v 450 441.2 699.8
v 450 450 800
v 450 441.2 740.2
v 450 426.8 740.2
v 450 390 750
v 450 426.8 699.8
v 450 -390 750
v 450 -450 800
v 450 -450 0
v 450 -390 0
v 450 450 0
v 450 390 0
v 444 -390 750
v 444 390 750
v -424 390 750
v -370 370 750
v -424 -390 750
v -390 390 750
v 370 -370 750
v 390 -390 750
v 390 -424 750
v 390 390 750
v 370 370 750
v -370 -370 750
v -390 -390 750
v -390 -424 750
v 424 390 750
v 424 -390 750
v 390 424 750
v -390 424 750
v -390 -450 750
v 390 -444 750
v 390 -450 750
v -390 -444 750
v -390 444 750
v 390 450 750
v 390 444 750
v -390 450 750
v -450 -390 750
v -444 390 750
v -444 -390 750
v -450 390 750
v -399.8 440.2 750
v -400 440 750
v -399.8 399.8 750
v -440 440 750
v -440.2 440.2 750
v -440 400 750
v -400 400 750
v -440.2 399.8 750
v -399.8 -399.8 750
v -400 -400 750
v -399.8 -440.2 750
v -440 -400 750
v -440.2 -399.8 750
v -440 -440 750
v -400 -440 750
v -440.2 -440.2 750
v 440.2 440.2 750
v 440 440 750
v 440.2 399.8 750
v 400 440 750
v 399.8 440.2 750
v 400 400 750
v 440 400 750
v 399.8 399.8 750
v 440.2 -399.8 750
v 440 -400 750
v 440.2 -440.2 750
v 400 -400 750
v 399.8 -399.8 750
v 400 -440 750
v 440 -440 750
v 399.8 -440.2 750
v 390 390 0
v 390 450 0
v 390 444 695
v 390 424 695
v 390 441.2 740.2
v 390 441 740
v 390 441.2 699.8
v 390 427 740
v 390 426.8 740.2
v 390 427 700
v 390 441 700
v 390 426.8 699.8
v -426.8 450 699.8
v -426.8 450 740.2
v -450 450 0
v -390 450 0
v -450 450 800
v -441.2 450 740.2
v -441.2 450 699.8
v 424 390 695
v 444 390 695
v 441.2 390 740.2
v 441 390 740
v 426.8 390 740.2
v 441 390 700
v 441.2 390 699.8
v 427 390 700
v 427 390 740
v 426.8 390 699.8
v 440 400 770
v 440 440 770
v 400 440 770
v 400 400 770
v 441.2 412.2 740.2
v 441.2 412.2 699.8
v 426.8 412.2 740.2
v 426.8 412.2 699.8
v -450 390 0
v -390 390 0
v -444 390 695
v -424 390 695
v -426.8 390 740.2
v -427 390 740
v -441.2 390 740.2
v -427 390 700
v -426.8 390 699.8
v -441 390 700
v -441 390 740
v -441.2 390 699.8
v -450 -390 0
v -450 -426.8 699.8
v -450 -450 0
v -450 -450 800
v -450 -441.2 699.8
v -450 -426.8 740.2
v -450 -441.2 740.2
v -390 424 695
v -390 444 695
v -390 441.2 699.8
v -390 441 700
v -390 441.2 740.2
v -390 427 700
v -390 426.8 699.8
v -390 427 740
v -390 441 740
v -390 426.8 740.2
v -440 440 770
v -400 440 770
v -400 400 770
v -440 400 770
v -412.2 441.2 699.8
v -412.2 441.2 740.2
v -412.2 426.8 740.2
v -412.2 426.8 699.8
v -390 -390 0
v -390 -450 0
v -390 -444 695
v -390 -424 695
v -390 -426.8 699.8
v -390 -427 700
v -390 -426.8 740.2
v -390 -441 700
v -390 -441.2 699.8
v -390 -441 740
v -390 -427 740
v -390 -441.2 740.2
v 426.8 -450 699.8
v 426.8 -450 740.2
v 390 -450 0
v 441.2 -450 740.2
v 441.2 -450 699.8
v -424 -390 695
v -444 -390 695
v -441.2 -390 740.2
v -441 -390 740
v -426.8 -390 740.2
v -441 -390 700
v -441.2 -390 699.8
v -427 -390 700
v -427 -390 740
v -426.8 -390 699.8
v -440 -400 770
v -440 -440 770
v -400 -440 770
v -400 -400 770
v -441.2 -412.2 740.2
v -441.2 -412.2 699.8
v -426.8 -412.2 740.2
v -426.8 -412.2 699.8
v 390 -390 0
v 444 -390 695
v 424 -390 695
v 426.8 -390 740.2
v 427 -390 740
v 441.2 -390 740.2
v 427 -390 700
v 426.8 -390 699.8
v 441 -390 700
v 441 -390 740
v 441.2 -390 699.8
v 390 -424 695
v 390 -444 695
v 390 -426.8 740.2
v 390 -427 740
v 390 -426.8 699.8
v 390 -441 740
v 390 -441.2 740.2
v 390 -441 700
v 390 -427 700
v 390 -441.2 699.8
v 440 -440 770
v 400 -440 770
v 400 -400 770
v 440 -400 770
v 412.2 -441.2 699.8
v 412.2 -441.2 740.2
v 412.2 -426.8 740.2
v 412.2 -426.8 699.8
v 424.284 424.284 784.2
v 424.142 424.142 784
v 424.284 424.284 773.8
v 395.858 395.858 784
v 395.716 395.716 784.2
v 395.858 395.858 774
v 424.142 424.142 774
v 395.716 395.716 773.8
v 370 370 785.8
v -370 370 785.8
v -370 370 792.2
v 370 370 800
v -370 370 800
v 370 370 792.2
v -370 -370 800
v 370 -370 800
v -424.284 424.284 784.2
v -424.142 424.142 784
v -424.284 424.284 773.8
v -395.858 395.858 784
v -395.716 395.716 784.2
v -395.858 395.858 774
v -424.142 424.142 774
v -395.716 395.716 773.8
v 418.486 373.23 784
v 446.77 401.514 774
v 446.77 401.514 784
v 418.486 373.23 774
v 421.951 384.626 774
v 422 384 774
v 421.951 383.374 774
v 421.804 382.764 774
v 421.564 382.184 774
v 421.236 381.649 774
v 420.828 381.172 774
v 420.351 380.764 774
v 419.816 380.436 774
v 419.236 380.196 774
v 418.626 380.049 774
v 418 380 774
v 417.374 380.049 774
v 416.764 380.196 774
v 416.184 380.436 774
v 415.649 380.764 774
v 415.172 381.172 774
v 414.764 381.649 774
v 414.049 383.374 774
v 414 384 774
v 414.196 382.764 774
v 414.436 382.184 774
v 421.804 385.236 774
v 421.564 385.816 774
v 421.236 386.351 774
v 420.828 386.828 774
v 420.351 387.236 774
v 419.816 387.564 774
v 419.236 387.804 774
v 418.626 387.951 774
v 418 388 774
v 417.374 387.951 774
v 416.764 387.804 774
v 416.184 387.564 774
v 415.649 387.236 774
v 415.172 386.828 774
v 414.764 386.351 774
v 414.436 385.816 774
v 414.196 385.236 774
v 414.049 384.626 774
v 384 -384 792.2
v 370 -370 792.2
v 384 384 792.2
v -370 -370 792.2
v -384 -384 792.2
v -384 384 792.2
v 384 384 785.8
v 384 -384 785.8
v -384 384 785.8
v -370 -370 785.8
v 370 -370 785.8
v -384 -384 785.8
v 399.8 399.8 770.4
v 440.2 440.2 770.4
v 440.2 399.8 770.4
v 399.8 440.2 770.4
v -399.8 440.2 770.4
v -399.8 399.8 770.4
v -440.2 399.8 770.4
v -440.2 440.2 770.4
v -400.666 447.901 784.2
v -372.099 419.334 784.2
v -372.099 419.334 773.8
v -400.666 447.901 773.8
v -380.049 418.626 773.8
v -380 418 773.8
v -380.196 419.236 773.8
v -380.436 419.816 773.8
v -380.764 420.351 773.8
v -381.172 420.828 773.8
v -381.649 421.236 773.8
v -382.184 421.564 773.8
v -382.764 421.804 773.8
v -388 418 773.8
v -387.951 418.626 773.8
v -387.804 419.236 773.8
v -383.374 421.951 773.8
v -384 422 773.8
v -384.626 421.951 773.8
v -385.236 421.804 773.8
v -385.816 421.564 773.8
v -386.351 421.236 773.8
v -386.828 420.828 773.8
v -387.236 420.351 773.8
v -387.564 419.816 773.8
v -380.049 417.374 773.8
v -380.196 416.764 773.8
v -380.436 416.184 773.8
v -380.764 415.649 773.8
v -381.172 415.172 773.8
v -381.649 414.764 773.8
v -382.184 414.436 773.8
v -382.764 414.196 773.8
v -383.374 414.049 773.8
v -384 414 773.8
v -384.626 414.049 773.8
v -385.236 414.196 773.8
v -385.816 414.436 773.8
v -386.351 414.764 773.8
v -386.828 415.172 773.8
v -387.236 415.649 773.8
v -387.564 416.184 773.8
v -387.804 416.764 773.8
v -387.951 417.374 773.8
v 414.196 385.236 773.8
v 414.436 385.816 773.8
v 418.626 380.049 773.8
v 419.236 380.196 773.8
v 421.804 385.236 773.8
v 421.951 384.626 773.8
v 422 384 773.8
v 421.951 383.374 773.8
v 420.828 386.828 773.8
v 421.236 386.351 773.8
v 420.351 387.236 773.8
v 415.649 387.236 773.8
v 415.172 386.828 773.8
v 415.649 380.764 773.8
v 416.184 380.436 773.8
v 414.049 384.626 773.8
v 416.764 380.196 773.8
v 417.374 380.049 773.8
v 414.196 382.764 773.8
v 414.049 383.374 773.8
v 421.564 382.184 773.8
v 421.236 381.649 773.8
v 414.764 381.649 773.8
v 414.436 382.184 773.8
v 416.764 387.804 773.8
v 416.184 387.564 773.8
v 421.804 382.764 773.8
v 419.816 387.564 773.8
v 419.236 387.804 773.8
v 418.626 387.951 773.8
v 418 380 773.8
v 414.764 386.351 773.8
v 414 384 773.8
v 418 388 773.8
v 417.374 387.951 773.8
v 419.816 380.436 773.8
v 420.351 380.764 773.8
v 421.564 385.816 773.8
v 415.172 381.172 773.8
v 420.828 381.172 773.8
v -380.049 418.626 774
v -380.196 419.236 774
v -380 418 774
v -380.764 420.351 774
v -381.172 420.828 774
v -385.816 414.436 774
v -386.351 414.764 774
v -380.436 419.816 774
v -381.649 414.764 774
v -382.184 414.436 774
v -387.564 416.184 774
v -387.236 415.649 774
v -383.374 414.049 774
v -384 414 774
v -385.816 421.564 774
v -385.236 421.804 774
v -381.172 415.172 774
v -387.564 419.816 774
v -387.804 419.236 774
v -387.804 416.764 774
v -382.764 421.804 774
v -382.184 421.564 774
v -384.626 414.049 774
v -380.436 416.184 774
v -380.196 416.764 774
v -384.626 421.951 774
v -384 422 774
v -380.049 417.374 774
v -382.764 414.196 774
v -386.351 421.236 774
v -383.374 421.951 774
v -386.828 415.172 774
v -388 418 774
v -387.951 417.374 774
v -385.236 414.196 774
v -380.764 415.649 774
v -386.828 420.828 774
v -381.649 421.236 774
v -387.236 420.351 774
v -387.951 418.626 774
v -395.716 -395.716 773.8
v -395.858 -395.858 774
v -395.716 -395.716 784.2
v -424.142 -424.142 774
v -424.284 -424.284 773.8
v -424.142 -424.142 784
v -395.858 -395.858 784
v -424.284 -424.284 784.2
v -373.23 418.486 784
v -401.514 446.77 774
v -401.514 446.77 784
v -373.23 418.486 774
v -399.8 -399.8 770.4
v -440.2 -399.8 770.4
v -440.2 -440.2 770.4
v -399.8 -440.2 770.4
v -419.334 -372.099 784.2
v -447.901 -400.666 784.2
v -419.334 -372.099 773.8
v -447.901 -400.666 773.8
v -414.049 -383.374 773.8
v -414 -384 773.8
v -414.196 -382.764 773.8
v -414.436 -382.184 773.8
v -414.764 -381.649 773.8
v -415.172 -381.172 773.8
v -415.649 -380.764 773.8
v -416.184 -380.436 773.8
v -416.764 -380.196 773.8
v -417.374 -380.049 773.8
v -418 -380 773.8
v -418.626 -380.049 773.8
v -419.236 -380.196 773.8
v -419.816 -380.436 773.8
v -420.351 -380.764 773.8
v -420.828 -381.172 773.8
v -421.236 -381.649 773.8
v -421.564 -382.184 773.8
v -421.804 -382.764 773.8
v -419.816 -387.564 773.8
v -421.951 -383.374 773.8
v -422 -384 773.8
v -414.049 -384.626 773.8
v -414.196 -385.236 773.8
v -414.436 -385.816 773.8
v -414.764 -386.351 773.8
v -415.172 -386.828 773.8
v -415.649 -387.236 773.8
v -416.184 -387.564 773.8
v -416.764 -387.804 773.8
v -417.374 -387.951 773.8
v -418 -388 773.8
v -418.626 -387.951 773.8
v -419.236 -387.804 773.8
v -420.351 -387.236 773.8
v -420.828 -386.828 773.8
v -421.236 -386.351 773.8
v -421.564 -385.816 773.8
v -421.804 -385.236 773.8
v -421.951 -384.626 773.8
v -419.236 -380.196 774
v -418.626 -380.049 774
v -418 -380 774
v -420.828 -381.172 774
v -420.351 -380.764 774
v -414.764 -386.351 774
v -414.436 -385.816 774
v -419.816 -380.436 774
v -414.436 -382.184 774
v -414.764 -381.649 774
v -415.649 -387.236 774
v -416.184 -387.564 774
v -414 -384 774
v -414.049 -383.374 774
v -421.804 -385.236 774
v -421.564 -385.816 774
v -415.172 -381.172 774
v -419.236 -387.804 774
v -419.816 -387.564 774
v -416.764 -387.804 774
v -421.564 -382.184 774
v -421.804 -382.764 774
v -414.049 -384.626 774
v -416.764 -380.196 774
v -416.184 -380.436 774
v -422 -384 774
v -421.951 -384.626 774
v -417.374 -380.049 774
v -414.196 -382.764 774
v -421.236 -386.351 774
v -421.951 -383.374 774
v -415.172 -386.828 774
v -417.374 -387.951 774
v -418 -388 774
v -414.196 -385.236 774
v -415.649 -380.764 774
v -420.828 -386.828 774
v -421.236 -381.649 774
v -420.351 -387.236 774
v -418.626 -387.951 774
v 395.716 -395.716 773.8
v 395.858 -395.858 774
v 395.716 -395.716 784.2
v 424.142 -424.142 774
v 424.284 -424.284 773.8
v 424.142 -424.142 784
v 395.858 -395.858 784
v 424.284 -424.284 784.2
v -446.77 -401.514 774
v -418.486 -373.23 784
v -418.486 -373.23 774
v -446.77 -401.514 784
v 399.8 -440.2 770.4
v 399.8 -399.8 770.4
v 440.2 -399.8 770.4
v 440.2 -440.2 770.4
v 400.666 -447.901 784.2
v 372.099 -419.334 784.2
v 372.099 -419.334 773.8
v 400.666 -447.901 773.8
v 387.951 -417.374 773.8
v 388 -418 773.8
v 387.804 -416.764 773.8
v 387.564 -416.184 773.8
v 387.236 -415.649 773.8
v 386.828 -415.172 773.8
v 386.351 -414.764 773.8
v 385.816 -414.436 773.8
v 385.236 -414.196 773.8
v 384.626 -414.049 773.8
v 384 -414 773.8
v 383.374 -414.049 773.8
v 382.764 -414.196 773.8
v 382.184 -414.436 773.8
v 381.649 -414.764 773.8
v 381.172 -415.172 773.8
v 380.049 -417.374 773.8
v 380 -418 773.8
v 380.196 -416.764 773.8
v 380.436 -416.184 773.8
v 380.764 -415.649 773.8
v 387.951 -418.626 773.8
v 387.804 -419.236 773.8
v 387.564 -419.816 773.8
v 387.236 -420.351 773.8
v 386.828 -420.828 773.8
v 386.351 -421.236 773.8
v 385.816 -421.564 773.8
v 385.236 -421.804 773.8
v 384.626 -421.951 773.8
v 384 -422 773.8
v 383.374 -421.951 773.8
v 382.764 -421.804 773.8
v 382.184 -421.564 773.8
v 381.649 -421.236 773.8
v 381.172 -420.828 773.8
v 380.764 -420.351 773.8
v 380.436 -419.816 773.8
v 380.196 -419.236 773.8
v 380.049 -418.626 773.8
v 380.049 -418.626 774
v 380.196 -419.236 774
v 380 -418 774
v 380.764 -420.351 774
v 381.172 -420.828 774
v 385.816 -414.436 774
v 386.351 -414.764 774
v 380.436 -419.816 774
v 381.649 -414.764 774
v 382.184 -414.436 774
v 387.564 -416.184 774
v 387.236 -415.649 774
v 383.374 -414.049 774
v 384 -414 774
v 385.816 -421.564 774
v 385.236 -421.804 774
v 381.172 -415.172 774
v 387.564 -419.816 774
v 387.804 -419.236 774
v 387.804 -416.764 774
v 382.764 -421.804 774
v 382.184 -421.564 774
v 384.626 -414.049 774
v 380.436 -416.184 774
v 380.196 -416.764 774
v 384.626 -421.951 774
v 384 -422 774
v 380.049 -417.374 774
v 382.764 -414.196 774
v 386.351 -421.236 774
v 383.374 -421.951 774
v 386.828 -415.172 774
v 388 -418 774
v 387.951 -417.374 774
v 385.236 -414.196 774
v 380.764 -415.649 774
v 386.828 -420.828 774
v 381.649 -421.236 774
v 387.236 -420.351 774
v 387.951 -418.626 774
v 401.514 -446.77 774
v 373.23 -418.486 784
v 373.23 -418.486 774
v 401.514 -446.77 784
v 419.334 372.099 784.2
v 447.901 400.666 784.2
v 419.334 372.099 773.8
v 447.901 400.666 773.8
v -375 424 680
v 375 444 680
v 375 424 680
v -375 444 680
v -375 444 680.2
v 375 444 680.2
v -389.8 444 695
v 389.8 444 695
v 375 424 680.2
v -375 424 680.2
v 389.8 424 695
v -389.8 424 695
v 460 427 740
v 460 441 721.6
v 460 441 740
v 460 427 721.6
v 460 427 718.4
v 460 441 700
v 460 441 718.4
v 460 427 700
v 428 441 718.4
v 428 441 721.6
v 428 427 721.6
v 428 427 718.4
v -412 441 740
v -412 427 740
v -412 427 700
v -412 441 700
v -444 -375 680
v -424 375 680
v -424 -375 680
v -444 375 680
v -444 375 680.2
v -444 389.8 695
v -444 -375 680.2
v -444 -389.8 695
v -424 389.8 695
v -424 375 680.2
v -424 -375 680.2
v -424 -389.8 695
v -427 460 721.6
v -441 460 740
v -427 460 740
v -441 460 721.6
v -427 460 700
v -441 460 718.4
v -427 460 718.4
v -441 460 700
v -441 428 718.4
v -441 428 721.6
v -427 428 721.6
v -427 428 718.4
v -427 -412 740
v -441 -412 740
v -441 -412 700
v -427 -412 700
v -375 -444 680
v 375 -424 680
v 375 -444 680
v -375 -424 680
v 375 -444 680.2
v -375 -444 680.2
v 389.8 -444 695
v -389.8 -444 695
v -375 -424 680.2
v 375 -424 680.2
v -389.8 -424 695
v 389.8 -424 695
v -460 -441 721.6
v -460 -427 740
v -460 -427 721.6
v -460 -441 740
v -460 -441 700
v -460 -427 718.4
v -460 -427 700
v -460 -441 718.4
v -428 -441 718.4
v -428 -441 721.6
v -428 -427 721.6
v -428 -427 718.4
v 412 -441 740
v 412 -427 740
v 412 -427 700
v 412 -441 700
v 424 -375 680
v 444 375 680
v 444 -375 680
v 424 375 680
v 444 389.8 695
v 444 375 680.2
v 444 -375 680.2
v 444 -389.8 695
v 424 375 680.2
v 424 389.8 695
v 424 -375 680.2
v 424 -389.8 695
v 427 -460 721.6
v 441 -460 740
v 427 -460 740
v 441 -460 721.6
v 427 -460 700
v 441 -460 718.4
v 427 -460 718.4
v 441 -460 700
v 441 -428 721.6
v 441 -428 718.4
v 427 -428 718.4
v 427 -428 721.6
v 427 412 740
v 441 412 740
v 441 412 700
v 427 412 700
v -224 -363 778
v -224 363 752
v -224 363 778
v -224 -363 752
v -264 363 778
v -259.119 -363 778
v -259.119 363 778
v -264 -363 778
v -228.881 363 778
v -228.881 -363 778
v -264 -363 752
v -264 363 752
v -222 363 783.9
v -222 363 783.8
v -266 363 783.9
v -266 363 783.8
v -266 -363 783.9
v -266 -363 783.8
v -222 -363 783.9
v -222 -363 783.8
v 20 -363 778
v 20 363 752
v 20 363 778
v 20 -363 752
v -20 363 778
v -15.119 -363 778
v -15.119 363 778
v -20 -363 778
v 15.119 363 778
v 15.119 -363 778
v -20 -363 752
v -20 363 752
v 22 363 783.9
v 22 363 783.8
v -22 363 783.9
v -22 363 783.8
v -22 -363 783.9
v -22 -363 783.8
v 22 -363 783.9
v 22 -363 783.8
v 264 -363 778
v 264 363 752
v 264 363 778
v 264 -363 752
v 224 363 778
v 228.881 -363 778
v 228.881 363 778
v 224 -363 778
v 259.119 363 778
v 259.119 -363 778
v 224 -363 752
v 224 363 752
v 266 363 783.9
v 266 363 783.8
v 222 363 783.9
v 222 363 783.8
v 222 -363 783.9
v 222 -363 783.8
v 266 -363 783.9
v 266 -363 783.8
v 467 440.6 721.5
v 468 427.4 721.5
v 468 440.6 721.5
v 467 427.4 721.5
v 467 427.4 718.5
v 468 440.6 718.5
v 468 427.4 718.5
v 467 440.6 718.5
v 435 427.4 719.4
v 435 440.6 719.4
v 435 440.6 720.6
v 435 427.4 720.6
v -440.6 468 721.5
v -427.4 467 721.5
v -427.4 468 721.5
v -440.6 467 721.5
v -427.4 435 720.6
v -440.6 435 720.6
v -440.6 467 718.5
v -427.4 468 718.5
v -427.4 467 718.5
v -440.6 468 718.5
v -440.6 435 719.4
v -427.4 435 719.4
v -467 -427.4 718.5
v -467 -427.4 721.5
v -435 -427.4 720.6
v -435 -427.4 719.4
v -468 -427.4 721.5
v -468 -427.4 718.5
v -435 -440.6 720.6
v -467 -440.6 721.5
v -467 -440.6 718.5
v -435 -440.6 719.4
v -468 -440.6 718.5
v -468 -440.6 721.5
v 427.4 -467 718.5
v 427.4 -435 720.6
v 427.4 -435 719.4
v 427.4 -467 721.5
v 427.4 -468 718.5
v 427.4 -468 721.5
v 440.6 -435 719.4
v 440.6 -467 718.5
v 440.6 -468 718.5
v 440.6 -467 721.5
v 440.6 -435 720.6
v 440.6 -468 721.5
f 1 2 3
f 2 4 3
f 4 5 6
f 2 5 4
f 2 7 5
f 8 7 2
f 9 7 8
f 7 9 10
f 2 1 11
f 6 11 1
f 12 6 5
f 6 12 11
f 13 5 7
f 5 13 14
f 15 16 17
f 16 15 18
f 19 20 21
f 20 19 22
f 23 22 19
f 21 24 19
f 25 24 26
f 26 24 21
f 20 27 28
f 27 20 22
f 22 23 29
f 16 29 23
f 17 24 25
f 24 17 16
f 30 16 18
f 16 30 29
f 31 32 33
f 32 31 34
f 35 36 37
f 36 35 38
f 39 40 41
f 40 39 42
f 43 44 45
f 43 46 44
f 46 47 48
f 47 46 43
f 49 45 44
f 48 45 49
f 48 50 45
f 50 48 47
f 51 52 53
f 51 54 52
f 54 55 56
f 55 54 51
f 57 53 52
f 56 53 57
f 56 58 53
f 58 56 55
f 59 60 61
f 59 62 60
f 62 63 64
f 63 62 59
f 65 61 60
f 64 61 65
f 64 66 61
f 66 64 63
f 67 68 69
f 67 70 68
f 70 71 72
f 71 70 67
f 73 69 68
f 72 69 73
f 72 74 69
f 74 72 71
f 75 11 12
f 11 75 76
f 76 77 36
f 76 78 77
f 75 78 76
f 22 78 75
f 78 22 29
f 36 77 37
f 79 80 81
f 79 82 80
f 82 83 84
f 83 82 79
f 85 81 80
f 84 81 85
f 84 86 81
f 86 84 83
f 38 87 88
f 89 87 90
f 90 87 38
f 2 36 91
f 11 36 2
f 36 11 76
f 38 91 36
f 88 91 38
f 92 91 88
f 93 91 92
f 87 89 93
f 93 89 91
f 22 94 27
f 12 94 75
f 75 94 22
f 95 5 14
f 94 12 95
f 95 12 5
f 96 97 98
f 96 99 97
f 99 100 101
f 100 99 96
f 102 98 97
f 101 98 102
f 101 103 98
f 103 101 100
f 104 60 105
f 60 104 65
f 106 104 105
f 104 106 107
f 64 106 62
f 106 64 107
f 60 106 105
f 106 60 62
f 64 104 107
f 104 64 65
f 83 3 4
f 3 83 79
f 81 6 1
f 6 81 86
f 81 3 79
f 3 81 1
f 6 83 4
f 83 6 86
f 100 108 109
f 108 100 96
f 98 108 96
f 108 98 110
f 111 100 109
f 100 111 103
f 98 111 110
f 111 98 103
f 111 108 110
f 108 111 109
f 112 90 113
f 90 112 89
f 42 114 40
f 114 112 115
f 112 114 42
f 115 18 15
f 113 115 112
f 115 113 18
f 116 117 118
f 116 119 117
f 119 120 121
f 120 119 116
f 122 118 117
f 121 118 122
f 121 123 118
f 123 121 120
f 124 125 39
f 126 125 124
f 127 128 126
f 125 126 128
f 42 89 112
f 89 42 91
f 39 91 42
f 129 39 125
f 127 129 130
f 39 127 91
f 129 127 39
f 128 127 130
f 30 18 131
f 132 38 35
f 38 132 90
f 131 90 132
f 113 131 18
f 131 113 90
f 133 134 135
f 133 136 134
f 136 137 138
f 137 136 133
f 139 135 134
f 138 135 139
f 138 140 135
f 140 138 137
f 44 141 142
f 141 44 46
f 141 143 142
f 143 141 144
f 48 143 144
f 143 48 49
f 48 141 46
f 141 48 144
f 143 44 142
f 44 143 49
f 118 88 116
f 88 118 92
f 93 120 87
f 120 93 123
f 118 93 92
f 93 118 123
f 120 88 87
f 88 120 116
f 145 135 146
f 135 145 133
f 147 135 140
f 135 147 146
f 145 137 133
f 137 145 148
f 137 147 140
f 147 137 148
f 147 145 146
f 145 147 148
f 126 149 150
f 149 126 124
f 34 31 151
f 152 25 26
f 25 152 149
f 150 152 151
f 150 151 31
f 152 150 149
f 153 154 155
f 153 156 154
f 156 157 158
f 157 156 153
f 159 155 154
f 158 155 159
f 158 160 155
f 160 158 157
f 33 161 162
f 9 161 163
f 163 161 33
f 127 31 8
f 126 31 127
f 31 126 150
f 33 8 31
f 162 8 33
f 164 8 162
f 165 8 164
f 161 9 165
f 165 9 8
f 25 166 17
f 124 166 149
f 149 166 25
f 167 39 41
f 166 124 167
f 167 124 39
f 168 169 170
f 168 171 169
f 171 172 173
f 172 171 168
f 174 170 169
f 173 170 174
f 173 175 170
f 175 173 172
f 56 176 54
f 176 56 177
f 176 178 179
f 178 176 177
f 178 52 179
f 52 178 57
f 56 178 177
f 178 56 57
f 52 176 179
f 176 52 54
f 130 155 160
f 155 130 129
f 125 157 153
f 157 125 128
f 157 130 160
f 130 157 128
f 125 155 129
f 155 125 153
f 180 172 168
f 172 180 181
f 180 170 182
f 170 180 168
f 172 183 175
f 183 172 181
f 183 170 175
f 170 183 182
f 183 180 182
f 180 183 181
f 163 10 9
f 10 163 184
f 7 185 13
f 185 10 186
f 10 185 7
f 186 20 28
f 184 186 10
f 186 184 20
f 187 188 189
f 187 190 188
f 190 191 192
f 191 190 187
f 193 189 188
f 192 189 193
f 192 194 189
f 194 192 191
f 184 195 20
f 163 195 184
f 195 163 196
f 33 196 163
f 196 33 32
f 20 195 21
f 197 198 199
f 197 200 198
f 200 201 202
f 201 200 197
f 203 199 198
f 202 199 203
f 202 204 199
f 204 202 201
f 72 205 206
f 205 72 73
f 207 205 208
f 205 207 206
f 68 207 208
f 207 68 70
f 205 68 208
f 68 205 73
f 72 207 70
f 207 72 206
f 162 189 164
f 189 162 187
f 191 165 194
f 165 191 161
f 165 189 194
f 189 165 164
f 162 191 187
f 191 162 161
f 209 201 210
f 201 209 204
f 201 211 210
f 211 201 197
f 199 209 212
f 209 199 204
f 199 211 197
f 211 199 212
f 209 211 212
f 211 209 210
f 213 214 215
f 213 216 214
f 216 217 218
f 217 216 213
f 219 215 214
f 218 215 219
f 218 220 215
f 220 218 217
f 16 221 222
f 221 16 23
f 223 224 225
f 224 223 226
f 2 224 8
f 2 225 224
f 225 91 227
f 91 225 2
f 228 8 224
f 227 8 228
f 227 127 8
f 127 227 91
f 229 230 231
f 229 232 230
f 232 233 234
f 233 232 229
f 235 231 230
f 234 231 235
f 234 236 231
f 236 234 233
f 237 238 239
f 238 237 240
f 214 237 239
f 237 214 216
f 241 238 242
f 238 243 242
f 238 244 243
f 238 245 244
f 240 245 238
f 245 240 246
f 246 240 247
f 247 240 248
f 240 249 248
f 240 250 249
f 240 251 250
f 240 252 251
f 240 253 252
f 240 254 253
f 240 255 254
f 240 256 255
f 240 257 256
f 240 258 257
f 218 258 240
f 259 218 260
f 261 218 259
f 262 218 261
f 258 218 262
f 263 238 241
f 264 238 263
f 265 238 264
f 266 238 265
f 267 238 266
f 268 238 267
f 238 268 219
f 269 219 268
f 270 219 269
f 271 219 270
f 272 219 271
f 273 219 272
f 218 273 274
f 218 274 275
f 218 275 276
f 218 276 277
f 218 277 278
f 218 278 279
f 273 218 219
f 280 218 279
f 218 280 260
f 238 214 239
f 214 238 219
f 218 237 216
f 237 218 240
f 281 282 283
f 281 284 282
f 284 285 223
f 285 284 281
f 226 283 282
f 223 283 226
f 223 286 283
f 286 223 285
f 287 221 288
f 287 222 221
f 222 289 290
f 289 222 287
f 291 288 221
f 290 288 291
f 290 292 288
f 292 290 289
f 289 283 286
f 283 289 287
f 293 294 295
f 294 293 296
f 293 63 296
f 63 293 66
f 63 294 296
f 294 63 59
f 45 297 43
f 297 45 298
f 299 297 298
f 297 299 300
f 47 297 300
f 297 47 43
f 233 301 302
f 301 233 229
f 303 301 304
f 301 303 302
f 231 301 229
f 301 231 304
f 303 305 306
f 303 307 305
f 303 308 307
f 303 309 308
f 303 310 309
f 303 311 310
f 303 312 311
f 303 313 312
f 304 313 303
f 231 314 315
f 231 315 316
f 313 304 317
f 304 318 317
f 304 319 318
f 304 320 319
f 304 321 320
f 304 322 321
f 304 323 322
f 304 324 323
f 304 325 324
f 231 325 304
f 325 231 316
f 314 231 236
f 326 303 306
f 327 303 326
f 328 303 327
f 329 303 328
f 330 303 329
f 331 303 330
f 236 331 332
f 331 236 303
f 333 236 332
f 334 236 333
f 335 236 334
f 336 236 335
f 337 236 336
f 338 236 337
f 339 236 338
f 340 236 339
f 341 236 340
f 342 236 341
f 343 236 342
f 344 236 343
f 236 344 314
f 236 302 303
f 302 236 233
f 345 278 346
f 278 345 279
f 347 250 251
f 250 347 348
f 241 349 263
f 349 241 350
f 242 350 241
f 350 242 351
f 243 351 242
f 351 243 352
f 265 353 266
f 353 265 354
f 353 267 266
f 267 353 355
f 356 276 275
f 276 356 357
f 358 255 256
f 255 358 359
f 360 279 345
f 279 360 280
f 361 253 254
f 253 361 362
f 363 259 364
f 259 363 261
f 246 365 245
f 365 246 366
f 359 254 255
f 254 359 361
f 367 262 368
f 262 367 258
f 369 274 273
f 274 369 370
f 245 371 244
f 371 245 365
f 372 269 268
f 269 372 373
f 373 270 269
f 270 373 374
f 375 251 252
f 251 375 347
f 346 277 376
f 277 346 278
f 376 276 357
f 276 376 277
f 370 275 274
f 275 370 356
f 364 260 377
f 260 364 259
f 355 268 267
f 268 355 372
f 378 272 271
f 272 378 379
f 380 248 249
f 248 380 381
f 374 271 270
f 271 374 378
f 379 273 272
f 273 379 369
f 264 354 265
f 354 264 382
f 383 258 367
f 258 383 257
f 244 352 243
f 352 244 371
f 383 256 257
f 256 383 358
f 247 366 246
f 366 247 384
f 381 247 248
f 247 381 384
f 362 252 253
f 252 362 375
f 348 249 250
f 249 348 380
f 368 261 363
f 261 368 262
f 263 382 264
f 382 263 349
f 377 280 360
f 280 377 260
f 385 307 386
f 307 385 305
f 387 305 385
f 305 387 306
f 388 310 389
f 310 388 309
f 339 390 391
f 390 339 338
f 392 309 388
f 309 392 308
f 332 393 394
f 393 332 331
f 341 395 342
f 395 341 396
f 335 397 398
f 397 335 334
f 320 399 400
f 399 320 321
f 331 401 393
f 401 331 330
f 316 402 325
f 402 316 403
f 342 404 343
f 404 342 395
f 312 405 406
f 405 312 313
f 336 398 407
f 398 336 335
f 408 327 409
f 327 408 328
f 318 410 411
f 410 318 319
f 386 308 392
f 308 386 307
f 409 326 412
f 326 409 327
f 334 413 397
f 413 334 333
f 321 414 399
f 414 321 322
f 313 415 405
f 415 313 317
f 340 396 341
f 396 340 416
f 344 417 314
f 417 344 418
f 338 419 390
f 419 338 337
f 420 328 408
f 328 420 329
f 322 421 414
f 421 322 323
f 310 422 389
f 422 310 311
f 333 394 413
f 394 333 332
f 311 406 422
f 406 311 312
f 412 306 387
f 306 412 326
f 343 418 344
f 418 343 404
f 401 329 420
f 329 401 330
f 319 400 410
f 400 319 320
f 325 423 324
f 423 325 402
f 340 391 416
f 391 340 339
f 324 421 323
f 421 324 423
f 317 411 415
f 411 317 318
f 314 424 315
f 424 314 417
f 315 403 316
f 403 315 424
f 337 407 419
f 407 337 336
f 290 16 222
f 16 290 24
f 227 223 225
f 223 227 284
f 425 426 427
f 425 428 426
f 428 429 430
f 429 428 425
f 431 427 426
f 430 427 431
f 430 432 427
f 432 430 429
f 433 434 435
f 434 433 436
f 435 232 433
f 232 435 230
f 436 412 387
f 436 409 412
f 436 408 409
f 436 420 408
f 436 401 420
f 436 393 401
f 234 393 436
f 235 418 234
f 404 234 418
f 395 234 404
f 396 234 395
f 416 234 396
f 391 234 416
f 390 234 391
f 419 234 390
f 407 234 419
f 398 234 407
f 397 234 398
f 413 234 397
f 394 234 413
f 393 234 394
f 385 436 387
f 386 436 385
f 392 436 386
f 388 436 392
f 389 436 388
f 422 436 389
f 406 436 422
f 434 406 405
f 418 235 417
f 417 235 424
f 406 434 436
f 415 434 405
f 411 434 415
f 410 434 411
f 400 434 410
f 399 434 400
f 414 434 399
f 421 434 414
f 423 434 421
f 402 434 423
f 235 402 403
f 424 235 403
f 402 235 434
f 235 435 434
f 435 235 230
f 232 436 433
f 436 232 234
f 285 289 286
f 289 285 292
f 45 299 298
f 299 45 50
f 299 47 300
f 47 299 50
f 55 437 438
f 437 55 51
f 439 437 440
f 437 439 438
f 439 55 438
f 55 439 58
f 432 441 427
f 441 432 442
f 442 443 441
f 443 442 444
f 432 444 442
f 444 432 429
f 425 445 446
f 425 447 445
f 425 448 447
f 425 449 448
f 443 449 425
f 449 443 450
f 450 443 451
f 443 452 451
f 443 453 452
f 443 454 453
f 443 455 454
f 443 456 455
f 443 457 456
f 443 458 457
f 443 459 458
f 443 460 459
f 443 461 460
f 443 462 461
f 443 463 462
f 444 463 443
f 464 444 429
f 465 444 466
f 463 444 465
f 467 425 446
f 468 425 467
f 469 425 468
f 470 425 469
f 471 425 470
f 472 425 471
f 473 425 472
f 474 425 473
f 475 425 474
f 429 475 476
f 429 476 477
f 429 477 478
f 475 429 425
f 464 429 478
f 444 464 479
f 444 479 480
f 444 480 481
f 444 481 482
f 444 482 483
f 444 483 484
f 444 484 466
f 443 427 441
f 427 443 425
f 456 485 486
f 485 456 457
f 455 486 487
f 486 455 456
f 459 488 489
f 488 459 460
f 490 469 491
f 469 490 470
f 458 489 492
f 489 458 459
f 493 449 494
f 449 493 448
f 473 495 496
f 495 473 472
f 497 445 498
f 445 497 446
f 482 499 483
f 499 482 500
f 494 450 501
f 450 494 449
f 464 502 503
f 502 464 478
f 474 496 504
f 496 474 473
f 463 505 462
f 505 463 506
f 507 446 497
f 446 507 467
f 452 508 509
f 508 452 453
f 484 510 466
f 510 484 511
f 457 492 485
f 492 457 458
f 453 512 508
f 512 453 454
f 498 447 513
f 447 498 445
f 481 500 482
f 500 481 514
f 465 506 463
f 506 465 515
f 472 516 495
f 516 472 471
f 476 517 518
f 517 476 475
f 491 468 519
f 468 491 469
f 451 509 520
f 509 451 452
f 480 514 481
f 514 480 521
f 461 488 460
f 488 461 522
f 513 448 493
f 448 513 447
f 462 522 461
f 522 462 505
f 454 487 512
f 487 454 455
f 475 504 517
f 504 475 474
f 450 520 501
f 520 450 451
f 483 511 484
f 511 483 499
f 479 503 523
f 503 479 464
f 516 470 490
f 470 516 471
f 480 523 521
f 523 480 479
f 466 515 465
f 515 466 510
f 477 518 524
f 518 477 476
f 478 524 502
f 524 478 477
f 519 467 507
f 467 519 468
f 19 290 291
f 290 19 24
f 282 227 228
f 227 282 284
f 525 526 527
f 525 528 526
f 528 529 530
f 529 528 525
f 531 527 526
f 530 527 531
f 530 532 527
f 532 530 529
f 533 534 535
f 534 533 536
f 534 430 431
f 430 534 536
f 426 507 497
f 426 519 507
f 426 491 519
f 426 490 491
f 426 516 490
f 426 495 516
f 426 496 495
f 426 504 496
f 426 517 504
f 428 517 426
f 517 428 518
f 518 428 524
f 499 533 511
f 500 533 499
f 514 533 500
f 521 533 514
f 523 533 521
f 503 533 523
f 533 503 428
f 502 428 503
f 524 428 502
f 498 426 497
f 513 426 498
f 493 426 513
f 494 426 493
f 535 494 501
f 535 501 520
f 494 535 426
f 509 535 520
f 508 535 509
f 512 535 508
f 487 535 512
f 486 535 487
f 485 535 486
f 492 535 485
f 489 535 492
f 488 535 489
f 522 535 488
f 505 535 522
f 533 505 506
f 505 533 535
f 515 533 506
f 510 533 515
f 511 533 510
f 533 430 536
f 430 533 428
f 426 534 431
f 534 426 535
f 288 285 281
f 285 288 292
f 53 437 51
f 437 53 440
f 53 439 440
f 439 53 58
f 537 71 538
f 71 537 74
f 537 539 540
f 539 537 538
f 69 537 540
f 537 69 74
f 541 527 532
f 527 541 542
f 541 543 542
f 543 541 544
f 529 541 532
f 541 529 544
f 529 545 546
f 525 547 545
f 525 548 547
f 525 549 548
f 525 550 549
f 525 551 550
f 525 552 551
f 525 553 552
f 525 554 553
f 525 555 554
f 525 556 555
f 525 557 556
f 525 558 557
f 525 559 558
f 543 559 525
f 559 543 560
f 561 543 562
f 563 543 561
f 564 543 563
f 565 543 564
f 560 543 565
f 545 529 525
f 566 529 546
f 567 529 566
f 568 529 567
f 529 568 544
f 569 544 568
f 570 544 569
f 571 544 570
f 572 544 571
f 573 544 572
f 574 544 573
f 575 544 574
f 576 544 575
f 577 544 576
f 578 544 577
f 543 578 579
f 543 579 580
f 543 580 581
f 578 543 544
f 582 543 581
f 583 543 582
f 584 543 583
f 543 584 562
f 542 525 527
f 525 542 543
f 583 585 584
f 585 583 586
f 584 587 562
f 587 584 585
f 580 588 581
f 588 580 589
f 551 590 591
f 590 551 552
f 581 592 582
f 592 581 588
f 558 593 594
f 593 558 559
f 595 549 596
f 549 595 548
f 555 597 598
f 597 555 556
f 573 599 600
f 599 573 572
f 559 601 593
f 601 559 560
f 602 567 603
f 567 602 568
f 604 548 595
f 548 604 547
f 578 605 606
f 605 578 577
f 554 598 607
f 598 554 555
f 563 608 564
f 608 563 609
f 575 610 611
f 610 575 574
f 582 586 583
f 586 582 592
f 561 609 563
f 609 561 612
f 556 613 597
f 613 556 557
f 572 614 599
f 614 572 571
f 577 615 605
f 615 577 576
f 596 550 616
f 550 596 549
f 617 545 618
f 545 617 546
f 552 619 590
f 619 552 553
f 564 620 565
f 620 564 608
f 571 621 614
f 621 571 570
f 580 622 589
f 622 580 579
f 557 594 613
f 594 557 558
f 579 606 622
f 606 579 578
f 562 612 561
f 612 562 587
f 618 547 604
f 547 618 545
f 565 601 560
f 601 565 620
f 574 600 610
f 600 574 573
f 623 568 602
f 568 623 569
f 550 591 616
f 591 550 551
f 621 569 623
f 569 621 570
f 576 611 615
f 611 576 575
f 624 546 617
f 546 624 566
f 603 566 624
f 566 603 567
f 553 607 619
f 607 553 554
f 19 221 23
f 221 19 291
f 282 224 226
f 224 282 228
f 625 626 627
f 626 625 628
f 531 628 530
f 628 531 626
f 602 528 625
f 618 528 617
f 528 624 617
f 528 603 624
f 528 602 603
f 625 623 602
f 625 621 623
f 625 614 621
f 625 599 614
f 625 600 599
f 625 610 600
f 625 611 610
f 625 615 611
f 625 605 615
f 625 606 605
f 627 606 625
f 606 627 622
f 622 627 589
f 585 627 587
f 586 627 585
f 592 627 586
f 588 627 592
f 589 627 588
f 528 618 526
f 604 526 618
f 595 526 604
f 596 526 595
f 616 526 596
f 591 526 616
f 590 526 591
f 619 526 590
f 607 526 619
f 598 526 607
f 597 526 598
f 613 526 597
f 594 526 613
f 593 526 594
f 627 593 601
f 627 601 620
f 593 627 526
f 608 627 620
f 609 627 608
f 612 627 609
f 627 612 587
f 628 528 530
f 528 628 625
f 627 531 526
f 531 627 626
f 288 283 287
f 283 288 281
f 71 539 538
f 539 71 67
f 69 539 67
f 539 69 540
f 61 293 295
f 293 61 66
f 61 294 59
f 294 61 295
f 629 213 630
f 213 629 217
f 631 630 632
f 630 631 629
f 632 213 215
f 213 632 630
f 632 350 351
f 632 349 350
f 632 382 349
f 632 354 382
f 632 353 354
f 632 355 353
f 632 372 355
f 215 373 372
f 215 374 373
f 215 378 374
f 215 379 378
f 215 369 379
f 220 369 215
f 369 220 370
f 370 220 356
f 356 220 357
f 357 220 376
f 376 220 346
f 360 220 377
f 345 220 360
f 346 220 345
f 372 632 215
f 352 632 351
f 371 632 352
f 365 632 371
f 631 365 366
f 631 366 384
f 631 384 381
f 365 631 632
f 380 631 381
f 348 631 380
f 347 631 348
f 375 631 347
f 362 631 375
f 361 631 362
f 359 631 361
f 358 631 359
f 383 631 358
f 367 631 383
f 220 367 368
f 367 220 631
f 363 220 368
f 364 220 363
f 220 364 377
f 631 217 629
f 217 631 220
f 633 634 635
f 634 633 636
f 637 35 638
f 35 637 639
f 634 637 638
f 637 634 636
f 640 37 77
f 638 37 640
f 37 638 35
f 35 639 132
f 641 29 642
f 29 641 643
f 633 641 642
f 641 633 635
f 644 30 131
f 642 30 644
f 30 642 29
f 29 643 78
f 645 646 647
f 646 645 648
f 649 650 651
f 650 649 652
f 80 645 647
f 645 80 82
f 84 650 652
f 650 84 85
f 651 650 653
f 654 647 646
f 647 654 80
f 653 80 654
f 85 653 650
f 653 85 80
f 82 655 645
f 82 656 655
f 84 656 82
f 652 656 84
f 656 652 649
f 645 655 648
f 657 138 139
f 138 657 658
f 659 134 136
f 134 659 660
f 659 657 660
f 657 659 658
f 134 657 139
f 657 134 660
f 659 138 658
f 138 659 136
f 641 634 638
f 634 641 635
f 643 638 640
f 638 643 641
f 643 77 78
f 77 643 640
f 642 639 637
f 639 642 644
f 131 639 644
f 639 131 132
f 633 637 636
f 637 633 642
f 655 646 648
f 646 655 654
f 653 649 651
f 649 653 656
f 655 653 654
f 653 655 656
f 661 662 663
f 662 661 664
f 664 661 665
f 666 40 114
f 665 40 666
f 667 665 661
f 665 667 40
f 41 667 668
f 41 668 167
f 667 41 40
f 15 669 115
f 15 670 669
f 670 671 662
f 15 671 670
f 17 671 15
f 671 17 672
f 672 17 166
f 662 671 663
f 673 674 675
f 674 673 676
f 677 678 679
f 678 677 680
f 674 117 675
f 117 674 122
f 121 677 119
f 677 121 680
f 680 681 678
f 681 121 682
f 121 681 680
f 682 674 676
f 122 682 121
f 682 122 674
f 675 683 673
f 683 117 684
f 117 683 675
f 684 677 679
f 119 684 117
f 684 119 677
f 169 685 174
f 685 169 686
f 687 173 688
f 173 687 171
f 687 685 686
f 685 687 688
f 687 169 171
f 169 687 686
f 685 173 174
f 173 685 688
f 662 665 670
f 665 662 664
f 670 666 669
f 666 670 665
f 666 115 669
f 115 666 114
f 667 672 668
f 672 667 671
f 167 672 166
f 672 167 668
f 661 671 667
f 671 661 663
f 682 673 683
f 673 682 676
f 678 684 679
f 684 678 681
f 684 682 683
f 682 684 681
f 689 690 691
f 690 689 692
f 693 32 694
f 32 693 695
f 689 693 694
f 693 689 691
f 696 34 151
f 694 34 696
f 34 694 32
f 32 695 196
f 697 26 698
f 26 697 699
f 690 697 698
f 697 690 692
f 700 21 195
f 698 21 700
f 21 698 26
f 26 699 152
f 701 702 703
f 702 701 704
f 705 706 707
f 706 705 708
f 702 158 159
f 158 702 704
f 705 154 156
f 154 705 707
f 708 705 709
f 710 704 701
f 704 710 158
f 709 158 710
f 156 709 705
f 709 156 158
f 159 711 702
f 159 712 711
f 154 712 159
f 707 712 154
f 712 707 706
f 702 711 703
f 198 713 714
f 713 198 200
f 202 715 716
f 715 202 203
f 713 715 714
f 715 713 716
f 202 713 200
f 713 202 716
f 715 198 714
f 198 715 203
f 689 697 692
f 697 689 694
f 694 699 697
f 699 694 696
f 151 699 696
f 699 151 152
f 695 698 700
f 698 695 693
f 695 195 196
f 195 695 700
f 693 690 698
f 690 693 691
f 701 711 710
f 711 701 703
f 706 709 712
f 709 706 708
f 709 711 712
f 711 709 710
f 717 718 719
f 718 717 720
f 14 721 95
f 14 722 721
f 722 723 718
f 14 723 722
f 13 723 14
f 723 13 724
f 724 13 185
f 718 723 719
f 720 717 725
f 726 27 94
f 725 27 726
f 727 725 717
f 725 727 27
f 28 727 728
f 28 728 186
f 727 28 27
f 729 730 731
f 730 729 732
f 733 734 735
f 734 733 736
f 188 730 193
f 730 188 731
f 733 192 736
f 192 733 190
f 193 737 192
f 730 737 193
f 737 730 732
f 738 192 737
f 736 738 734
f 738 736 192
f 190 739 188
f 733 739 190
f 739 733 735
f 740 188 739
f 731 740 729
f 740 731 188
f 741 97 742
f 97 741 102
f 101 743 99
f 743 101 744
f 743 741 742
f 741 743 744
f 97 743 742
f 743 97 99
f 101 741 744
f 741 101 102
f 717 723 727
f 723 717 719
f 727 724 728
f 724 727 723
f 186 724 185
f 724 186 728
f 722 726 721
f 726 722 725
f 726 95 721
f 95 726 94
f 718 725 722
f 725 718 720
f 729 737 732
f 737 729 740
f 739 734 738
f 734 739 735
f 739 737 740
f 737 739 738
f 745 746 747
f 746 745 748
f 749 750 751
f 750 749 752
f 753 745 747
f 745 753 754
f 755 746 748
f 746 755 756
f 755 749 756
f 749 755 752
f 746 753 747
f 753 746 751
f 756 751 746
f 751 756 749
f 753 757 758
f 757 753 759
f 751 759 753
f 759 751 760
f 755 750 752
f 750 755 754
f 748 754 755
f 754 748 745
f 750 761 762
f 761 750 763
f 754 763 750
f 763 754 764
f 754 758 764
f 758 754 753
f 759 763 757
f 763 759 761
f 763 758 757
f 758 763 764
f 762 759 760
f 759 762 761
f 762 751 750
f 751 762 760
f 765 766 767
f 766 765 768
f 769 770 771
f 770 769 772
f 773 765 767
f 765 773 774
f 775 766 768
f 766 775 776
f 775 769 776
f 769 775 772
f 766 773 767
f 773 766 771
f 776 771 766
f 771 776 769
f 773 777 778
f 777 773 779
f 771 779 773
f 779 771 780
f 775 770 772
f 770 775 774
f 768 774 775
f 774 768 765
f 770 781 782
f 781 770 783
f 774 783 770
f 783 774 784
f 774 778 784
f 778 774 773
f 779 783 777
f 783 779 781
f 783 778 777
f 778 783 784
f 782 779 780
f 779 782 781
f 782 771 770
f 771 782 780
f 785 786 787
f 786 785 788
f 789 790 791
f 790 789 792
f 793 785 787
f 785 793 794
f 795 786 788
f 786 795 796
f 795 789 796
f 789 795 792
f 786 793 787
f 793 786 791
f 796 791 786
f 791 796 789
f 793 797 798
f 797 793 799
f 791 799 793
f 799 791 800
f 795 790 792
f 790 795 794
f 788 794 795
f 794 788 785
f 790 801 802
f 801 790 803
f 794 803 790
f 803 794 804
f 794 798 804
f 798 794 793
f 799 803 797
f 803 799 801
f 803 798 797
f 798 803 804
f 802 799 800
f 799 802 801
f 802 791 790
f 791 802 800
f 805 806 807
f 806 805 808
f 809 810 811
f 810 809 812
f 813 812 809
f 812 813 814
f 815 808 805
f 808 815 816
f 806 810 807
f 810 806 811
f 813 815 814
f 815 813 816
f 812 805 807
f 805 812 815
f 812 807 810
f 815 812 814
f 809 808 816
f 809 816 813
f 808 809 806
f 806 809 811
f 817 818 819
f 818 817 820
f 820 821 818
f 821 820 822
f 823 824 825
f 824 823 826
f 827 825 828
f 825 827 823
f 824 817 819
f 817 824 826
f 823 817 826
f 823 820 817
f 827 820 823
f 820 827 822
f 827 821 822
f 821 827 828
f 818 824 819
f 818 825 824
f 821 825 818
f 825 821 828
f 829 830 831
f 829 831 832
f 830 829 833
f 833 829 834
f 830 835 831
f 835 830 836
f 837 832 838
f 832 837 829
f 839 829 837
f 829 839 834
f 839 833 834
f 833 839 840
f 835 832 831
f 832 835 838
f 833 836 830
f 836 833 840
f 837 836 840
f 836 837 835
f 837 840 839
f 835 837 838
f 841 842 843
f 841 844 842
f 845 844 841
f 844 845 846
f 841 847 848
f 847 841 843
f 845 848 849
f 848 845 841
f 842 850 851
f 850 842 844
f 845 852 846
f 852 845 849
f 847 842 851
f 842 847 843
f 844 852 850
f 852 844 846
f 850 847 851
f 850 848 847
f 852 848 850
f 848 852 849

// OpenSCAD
// file: parts.scad
$fn=40;

// ---- 桌腿 ----

module leg(){
  difference(){
    union(){
      translate([390.000,390.000,0.000]) cube([60.000,60.000,750.000]);
      translate([400.000,400.000,750.000]) cube([40.000,40.000,20.000]);
    }
    // 牙板透榫槽（沿 +x，+y 侧牙板 A 端穿入）
    translate([389.000,426.800,699.800]) cube([62.000,14.400,40.400]);
    // 牙板闷榫槽（沿 +y，+x 侧牙板 B 端）
    translate([426.800,389.000,699.800]) cube([14.400,23.200,40.400]);
  }
}

// ---- 边框 ----

module rail(){
  difference(){
    union(){
      translate([0,0,750]) linear_extrude(height=50) polygon(points=[[-370,370],[370,370],[450.0,450.0],[-450.0,450.0]]);
      translate([420.607,399.393,779.0]) rotate([0,0,-45]) cube([34,40,10],center=true);
    }
    // 面板槽：全长开通至 45° 端面（角部两框的槽合起来成 L 形）
    translate([-450.000,370.000,785.800]) cube([900.000,14.000,6.400]);
    // 腿顶榫卯（两端各半，合起来 40x40x20）
    translate([399.800,399.800,750.000]) cube([40.400,40.400,20.400]);
    translate([-440.200,399.800,750.000]) cube([40.400,40.400,20.400]);
    // 格角暗榫卯
    translate([-398.545,421.455,779.0]) rotate([0,0,45]) cube([34.4,40.4,10.4],center=true);
    // 竹销孔：+x 端穿暗榫，-x 端穿本体
    translate([418,384,750]) cylinder(h=34,r=4.0,$fn=40);
    translate([-384,418,750]) cylinder(h=34,r=4.0,$fn=40);
  }
}

// ---- 牙板 ----

module apron(){
  difference(){
    union(){
      translate([-390.000,424.000,680.000]) cube([780.000,20.000,70.000]);
      // A 端：透榫（390..460）
      translate([390.000,427.000,700.000]) cube([70.000,14.000,40.000]);
      // B 端：闷榫（-412..-390）
      translate([-412.000,427.000,700.000]) cube([22.000,14.000,40.000]);
    }
    hull(){ translate([375.000,423.500,680.000]) cube([15.000,21.000,0.200]); translate([389.800,423.500,680.000]) cube([0.200,21.000,15.000]); }
    hull(){ translate([-390.000,423.500,680.000]) cube([15.000,21.000,0.200]); translate([-390.000,423.500,680.000]) cube([0.200,21.000,15.000]); }
    // 透榫楔槽（横槽，撑开榫头上下两片）
    translate([428.000,426.900,718.400]) cube([32.200,14.200,3.200]);
  }
}

// ---- 面板-边板 ----

module panel_outer(){
  difference(){
    union(){
      translate([-365.000,-365.000,778.000]) cube([730.000,244.000,22.000]);
      translate([0,0,786]) linear_extrude(height=6) polygon(points=[[-379,-121],[-379,-377],[-377,-379],[377,-379],[379,-377],[379,-121],[365,-121],[365,-365],[-365,-365],[-365,-121]]);
    }
    // 内侧龙凤榫槽（向板内 8 深：y -129..-121）
    translate([-365.000,-129.000,785.800]) cube([730.000,8.000,6.400]);
    // 穿带燕尾槽
    hull(){ translate([-259.200,-365.000,778.000]) cube([30.400,244.000,0.100]); translate([-266.200,-365.000,783.900]) cube([44.400,244.000,0.100]); }
    hull(){ translate([-15.200,-365.000,778.000]) cube([30.400,244.000,0.100]); translate([-22.200,-365.000,783.900]) cube([44.400,244.000,0.100]); }
    hull(){ translate([228.800,-365.000,778.000]) cube([30.400,244.000,0.100]); translate([221.800,-365.000,783.900]) cube([44.400,244.000,0.100]); }
  }
}

// ---- 面板-中板 ----

module panel_middle(){
  difference(){
    union(){
      translate([-365.000,-121.000,778.000]) cube([730.000,242.000,22.000]);
      translate([365.000,-121.000,786.000]) cube([14.000,242.000,6.000]);
      translate([-379.000,-121.000,786.000]) cube([14.000,242.000,6.000]);
    }
    // 两侧龙凤榫槽（各向板内 8 深）
    translate([-365.000,-121.000,785.800]) cube([730.000,8.000,6.400]);
    translate([-365.000,113.000,785.800]) cube([730.000,8.000,6.400]);
    hull(){ translate([-259.200,-121.000,778.000]) cube([30.400,242.000,0.100]); translate([-266.200,-121.000,783.900]) cube([44.400,242.000,0.100]); }
    hull(){ translate([-15.200,-121.000,778.000]) cube([30.400,242.000,0.100]); translate([-22.200,-121.000,783.900]) cube([44.400,242.000,0.100]); }
    hull(){ translate([228.800,-121.000,778.000]) cube([30.400,242.000,0.100]); translate([221.800,-121.000,783.900]) cube([44.400,242.000,0.100]); }
  }
}

// ---- 穿带 ----

module cleat(){
  union(){
    translate([-20.000,-363.000,752.000]) cube([40.000,726.000,26.000]);
    hull(){
      translate([-15.000,-363.000,777.900]) cube([30.000,726.000,0.050]);
      translate([-22.000,-363.000,783.800]) cube([44.000,726.000,0.100]);
    }
  }
}

// ---- 穿簧 ----
module spline(){ translate([-360.000,-7.800,786.100]) cube([720.000,15.600,5.800]); }
// ---- 木楔 ----
module wedge(){ hull(){ translate([435.000,427.400,719.400]) cube([1.000,13.200,1.200]); translate([467.000,427.400,718.500]) cube([1.000,13.200,3.000]); } }
// ---- 竹销 ----
module pin(){ translate([0,0,750]) cylinder(h=34,r=4.0,$fn=40); }
// main file
include <parts.scad>
color([0.42,0.28,0.16]) translate([0,0,0]) rotate([0,0,0]) leg();
color([0.42,0.28,0.16]) translate([0,0,0]) rotate([0,0,90]) leg();
color([0.42,0.28,0.16]) translate([0,0,0]) rotate([0,0,180]) leg();
color([0.42,0.28,0.16]) translate([0,0,0]) rotate([0,0,270]) leg();
color([0.54,0.37,0.21]) translate([0,0,0]) rotate([0,0,0]) rail();
color([0.54,0.37,0.21]) translate([0,0,0]) rotate([0,0,90]) rail();
color([0.54,0.37,0.21]) translate([0,0,0]) rotate([0,0,180]) rail();
color([0.54,0.37,0.21]) translate([0,0,0]) rotate([0,0,270]) rail();
color([0.49,0.33,0.19]) translate([0,0,0]) rotate([0,0,0]) apron();
color([0.49,0.33,0.19]) translate([0,0,0]) rotate([0,0,90]) apron();
color([0.49,0.33,0.19]) translate([0,0,0]) rotate([0,0,180]) apron();
color([0.49,0.33,0.19]) translate([0,0,0]) rotate([0,0,270]) apron();
color([0.62,0.44,0.26]) translate([-244,0,0]) rotate([0,0,0]) cleat();
color([0.62,0.44,0.26]) translate([0,0,0]) rotate([0,0,0]) cleat();
color([0.62,0.44,0.26]) translate([244,0,0]) rotate([0,0,0]) cleat();
color([0.3,0.19,0.1]) translate([0,0,0]) rotate([0,0,0]) wedge();
color([0.3,0.19,0.1]) translate([0,0,0]) rotate([0,0,90]) wedge();
color([0.3,0.19,0.1]) translate([0,0,0]) rotate([0,0,180]) wedge();
color([0.3,0.19,0.1]) translate([0,0,0]) rotate([0,0,270]) wedge();
color([0.86,0.8,0.55]) translate([418,384,0]) rotate([0,0,0]) pin();
color([0.86,0.8,0.55]) translate([-384,418,0]) rotate([0,0,0]) pin();
color([0.86,0.8,0.55]) translate([-418,-384,0]) rotate([0,0,0]) pin();
color([0.86,0.8,0.55]) translate([384,-418,0]) rotate([0,0,0]) pin();
